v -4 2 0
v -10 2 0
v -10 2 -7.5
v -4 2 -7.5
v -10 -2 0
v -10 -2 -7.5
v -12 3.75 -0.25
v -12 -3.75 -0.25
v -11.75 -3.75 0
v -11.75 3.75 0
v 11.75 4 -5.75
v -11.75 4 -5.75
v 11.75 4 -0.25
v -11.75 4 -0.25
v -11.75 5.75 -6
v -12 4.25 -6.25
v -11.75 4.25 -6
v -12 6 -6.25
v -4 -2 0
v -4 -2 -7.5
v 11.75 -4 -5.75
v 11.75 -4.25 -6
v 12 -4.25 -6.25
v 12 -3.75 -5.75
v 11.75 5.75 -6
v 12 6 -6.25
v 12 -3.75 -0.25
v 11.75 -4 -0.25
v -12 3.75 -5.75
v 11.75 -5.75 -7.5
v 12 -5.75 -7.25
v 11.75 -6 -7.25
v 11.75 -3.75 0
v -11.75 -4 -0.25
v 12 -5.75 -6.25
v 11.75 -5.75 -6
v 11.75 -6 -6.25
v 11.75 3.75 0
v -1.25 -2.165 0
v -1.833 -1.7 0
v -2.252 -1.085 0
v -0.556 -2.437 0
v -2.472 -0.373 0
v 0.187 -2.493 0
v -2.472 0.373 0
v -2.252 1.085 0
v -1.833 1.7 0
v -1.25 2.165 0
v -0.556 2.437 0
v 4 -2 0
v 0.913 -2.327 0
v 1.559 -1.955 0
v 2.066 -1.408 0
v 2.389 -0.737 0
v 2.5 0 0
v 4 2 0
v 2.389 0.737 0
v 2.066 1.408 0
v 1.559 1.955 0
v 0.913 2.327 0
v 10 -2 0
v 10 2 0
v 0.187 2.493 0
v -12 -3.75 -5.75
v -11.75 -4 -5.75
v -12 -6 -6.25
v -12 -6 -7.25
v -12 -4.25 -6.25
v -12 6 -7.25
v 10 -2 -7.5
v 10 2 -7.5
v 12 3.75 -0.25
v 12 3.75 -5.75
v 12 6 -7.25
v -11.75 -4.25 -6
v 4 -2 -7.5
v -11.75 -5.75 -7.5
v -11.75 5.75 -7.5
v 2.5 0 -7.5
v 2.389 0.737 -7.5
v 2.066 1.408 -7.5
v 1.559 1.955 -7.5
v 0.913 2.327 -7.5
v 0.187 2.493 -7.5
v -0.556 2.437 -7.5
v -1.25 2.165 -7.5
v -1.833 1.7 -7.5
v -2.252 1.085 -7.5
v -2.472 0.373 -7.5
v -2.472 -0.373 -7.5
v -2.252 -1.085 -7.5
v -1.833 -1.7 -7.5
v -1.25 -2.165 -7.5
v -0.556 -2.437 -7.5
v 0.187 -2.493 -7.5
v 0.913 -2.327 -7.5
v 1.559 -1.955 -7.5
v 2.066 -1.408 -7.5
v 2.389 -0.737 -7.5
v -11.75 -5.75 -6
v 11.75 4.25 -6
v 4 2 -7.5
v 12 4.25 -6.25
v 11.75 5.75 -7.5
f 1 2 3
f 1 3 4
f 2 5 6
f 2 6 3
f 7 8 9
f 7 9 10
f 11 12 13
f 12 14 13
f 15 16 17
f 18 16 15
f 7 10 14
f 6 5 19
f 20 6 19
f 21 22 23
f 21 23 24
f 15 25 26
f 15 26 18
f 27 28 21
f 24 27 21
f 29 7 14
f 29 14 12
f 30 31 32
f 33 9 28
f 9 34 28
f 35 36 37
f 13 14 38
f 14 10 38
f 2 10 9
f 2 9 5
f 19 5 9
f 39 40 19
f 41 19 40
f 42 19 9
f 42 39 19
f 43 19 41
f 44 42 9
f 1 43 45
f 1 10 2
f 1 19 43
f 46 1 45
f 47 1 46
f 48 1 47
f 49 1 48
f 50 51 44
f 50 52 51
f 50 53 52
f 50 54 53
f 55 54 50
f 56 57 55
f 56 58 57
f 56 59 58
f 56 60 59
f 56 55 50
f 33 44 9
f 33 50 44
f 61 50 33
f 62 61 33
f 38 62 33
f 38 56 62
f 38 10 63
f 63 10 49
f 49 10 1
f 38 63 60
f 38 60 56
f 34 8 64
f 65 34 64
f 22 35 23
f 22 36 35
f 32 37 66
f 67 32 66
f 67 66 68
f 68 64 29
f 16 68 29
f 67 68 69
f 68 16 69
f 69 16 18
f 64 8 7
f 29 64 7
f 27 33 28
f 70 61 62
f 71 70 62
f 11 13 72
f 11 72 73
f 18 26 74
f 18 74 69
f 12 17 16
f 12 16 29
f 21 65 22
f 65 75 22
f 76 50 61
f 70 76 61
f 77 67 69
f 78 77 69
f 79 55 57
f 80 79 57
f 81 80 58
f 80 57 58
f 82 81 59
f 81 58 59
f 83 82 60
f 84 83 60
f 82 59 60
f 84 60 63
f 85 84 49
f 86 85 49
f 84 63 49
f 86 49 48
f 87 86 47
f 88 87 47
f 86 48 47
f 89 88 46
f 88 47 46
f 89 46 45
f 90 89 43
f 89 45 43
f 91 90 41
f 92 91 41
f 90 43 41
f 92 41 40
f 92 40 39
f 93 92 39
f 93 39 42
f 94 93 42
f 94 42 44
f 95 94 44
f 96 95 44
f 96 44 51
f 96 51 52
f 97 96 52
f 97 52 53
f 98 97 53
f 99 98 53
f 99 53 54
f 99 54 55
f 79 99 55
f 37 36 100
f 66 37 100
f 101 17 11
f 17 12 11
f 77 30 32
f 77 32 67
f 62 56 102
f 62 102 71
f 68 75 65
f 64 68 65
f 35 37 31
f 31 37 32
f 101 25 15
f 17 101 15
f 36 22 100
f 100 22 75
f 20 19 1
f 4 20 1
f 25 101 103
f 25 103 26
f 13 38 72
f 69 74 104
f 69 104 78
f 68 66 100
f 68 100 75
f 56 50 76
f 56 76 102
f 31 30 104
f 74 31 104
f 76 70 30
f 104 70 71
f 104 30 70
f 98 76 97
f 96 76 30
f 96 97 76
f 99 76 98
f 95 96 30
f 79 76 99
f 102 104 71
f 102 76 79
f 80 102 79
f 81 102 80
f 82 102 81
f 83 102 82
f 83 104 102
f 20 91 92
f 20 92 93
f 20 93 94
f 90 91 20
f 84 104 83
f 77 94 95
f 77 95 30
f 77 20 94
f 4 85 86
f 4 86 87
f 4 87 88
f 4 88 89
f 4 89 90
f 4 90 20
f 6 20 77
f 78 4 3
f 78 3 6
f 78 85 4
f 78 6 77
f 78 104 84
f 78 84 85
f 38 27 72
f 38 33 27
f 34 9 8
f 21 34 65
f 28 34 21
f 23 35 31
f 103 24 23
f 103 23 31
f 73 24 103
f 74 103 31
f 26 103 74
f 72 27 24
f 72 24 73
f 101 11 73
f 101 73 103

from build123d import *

# Parameters (mm, degrees)
SKETCH1_W           = 24
SKETCH1_H           = 8
BOSS_EXTRUDE1_DEPTH = 6
SKETCH2_W           = 24
SKETCH2_H           = 12
BOSS_EXTRUDE2_DEPTH = 1.5
SKETCH3_R           = 2.5
SKETCH3_W           = 6
SKETCH3_H           = 4
CUT_EXTRUDE1_DEPTH  = 16.370426149
CHAMFER1_SIZE       = 0.25


with BuildPart() as part:
    # Sketch1 → Boss-Extrude1 (new body)
    with BuildSketch(Plane.XY):
        Rectangle(SKETCH1_W, SKETCH1_H)
    extrude(amount=-BOSS_EXTRUDE1_DEPTH)

    # Sketch2 → Boss-Extrude2 (add)
    with BuildSketch(Plane(origin=(0, 0, -6), x_dir=(-1, 0, 0), z_dir=(0, 0, -1))):
        Rectangle(SKETCH2_W, SKETCH2_H)
    extrude(amount=BOSS_EXTRUDE2_DEPTH)

    # Sketch3 → Cut-Extrude1 (cut, through all)
    with BuildSketch(Plane.XY):
        Circle(SKETCH3_R)
        with Locations((-7, 0)):
            Rectangle(SKETCH3_W, SKETCH3_H)
        with Locations((7, 0)):
            Rectangle(SKETCH3_W, SKETCH3_H)
    extrude(amount=-CUT_EXTRUDE1_DEPTH, mode=Mode.SUBTRACT)

    # Chamfer1
    chamfer1_edges = [part.edges().sort_by_distance(p)[0] for p in [
        (12, 5, -6),
        (12, -5, -6),
        (0, -6, -6),
        (12, -6, -6.75),
        (-12, -5, -6),
        (0, 4, -6),
        (-12, 5, -6),
        (0, 6, -6),
        (12, 0, -7.5),
        (0, -6, -7.5),
        (-12, 0, -7.5),
        (0, 6, -7.5),
        (0, 4, 0),
        (12, 0, 0),
        (0, -4, 0),
        (-12, 0, 0),
        (-12, 4, -3),
        (12, 4, -3),
        (12, -4, -3),
        (-12, -4, -3),
        (0, -4, -6),
    ]]
    chamfer(chamfer1_edges, length=CHAMFER1_SIZE)


solid = part.part
